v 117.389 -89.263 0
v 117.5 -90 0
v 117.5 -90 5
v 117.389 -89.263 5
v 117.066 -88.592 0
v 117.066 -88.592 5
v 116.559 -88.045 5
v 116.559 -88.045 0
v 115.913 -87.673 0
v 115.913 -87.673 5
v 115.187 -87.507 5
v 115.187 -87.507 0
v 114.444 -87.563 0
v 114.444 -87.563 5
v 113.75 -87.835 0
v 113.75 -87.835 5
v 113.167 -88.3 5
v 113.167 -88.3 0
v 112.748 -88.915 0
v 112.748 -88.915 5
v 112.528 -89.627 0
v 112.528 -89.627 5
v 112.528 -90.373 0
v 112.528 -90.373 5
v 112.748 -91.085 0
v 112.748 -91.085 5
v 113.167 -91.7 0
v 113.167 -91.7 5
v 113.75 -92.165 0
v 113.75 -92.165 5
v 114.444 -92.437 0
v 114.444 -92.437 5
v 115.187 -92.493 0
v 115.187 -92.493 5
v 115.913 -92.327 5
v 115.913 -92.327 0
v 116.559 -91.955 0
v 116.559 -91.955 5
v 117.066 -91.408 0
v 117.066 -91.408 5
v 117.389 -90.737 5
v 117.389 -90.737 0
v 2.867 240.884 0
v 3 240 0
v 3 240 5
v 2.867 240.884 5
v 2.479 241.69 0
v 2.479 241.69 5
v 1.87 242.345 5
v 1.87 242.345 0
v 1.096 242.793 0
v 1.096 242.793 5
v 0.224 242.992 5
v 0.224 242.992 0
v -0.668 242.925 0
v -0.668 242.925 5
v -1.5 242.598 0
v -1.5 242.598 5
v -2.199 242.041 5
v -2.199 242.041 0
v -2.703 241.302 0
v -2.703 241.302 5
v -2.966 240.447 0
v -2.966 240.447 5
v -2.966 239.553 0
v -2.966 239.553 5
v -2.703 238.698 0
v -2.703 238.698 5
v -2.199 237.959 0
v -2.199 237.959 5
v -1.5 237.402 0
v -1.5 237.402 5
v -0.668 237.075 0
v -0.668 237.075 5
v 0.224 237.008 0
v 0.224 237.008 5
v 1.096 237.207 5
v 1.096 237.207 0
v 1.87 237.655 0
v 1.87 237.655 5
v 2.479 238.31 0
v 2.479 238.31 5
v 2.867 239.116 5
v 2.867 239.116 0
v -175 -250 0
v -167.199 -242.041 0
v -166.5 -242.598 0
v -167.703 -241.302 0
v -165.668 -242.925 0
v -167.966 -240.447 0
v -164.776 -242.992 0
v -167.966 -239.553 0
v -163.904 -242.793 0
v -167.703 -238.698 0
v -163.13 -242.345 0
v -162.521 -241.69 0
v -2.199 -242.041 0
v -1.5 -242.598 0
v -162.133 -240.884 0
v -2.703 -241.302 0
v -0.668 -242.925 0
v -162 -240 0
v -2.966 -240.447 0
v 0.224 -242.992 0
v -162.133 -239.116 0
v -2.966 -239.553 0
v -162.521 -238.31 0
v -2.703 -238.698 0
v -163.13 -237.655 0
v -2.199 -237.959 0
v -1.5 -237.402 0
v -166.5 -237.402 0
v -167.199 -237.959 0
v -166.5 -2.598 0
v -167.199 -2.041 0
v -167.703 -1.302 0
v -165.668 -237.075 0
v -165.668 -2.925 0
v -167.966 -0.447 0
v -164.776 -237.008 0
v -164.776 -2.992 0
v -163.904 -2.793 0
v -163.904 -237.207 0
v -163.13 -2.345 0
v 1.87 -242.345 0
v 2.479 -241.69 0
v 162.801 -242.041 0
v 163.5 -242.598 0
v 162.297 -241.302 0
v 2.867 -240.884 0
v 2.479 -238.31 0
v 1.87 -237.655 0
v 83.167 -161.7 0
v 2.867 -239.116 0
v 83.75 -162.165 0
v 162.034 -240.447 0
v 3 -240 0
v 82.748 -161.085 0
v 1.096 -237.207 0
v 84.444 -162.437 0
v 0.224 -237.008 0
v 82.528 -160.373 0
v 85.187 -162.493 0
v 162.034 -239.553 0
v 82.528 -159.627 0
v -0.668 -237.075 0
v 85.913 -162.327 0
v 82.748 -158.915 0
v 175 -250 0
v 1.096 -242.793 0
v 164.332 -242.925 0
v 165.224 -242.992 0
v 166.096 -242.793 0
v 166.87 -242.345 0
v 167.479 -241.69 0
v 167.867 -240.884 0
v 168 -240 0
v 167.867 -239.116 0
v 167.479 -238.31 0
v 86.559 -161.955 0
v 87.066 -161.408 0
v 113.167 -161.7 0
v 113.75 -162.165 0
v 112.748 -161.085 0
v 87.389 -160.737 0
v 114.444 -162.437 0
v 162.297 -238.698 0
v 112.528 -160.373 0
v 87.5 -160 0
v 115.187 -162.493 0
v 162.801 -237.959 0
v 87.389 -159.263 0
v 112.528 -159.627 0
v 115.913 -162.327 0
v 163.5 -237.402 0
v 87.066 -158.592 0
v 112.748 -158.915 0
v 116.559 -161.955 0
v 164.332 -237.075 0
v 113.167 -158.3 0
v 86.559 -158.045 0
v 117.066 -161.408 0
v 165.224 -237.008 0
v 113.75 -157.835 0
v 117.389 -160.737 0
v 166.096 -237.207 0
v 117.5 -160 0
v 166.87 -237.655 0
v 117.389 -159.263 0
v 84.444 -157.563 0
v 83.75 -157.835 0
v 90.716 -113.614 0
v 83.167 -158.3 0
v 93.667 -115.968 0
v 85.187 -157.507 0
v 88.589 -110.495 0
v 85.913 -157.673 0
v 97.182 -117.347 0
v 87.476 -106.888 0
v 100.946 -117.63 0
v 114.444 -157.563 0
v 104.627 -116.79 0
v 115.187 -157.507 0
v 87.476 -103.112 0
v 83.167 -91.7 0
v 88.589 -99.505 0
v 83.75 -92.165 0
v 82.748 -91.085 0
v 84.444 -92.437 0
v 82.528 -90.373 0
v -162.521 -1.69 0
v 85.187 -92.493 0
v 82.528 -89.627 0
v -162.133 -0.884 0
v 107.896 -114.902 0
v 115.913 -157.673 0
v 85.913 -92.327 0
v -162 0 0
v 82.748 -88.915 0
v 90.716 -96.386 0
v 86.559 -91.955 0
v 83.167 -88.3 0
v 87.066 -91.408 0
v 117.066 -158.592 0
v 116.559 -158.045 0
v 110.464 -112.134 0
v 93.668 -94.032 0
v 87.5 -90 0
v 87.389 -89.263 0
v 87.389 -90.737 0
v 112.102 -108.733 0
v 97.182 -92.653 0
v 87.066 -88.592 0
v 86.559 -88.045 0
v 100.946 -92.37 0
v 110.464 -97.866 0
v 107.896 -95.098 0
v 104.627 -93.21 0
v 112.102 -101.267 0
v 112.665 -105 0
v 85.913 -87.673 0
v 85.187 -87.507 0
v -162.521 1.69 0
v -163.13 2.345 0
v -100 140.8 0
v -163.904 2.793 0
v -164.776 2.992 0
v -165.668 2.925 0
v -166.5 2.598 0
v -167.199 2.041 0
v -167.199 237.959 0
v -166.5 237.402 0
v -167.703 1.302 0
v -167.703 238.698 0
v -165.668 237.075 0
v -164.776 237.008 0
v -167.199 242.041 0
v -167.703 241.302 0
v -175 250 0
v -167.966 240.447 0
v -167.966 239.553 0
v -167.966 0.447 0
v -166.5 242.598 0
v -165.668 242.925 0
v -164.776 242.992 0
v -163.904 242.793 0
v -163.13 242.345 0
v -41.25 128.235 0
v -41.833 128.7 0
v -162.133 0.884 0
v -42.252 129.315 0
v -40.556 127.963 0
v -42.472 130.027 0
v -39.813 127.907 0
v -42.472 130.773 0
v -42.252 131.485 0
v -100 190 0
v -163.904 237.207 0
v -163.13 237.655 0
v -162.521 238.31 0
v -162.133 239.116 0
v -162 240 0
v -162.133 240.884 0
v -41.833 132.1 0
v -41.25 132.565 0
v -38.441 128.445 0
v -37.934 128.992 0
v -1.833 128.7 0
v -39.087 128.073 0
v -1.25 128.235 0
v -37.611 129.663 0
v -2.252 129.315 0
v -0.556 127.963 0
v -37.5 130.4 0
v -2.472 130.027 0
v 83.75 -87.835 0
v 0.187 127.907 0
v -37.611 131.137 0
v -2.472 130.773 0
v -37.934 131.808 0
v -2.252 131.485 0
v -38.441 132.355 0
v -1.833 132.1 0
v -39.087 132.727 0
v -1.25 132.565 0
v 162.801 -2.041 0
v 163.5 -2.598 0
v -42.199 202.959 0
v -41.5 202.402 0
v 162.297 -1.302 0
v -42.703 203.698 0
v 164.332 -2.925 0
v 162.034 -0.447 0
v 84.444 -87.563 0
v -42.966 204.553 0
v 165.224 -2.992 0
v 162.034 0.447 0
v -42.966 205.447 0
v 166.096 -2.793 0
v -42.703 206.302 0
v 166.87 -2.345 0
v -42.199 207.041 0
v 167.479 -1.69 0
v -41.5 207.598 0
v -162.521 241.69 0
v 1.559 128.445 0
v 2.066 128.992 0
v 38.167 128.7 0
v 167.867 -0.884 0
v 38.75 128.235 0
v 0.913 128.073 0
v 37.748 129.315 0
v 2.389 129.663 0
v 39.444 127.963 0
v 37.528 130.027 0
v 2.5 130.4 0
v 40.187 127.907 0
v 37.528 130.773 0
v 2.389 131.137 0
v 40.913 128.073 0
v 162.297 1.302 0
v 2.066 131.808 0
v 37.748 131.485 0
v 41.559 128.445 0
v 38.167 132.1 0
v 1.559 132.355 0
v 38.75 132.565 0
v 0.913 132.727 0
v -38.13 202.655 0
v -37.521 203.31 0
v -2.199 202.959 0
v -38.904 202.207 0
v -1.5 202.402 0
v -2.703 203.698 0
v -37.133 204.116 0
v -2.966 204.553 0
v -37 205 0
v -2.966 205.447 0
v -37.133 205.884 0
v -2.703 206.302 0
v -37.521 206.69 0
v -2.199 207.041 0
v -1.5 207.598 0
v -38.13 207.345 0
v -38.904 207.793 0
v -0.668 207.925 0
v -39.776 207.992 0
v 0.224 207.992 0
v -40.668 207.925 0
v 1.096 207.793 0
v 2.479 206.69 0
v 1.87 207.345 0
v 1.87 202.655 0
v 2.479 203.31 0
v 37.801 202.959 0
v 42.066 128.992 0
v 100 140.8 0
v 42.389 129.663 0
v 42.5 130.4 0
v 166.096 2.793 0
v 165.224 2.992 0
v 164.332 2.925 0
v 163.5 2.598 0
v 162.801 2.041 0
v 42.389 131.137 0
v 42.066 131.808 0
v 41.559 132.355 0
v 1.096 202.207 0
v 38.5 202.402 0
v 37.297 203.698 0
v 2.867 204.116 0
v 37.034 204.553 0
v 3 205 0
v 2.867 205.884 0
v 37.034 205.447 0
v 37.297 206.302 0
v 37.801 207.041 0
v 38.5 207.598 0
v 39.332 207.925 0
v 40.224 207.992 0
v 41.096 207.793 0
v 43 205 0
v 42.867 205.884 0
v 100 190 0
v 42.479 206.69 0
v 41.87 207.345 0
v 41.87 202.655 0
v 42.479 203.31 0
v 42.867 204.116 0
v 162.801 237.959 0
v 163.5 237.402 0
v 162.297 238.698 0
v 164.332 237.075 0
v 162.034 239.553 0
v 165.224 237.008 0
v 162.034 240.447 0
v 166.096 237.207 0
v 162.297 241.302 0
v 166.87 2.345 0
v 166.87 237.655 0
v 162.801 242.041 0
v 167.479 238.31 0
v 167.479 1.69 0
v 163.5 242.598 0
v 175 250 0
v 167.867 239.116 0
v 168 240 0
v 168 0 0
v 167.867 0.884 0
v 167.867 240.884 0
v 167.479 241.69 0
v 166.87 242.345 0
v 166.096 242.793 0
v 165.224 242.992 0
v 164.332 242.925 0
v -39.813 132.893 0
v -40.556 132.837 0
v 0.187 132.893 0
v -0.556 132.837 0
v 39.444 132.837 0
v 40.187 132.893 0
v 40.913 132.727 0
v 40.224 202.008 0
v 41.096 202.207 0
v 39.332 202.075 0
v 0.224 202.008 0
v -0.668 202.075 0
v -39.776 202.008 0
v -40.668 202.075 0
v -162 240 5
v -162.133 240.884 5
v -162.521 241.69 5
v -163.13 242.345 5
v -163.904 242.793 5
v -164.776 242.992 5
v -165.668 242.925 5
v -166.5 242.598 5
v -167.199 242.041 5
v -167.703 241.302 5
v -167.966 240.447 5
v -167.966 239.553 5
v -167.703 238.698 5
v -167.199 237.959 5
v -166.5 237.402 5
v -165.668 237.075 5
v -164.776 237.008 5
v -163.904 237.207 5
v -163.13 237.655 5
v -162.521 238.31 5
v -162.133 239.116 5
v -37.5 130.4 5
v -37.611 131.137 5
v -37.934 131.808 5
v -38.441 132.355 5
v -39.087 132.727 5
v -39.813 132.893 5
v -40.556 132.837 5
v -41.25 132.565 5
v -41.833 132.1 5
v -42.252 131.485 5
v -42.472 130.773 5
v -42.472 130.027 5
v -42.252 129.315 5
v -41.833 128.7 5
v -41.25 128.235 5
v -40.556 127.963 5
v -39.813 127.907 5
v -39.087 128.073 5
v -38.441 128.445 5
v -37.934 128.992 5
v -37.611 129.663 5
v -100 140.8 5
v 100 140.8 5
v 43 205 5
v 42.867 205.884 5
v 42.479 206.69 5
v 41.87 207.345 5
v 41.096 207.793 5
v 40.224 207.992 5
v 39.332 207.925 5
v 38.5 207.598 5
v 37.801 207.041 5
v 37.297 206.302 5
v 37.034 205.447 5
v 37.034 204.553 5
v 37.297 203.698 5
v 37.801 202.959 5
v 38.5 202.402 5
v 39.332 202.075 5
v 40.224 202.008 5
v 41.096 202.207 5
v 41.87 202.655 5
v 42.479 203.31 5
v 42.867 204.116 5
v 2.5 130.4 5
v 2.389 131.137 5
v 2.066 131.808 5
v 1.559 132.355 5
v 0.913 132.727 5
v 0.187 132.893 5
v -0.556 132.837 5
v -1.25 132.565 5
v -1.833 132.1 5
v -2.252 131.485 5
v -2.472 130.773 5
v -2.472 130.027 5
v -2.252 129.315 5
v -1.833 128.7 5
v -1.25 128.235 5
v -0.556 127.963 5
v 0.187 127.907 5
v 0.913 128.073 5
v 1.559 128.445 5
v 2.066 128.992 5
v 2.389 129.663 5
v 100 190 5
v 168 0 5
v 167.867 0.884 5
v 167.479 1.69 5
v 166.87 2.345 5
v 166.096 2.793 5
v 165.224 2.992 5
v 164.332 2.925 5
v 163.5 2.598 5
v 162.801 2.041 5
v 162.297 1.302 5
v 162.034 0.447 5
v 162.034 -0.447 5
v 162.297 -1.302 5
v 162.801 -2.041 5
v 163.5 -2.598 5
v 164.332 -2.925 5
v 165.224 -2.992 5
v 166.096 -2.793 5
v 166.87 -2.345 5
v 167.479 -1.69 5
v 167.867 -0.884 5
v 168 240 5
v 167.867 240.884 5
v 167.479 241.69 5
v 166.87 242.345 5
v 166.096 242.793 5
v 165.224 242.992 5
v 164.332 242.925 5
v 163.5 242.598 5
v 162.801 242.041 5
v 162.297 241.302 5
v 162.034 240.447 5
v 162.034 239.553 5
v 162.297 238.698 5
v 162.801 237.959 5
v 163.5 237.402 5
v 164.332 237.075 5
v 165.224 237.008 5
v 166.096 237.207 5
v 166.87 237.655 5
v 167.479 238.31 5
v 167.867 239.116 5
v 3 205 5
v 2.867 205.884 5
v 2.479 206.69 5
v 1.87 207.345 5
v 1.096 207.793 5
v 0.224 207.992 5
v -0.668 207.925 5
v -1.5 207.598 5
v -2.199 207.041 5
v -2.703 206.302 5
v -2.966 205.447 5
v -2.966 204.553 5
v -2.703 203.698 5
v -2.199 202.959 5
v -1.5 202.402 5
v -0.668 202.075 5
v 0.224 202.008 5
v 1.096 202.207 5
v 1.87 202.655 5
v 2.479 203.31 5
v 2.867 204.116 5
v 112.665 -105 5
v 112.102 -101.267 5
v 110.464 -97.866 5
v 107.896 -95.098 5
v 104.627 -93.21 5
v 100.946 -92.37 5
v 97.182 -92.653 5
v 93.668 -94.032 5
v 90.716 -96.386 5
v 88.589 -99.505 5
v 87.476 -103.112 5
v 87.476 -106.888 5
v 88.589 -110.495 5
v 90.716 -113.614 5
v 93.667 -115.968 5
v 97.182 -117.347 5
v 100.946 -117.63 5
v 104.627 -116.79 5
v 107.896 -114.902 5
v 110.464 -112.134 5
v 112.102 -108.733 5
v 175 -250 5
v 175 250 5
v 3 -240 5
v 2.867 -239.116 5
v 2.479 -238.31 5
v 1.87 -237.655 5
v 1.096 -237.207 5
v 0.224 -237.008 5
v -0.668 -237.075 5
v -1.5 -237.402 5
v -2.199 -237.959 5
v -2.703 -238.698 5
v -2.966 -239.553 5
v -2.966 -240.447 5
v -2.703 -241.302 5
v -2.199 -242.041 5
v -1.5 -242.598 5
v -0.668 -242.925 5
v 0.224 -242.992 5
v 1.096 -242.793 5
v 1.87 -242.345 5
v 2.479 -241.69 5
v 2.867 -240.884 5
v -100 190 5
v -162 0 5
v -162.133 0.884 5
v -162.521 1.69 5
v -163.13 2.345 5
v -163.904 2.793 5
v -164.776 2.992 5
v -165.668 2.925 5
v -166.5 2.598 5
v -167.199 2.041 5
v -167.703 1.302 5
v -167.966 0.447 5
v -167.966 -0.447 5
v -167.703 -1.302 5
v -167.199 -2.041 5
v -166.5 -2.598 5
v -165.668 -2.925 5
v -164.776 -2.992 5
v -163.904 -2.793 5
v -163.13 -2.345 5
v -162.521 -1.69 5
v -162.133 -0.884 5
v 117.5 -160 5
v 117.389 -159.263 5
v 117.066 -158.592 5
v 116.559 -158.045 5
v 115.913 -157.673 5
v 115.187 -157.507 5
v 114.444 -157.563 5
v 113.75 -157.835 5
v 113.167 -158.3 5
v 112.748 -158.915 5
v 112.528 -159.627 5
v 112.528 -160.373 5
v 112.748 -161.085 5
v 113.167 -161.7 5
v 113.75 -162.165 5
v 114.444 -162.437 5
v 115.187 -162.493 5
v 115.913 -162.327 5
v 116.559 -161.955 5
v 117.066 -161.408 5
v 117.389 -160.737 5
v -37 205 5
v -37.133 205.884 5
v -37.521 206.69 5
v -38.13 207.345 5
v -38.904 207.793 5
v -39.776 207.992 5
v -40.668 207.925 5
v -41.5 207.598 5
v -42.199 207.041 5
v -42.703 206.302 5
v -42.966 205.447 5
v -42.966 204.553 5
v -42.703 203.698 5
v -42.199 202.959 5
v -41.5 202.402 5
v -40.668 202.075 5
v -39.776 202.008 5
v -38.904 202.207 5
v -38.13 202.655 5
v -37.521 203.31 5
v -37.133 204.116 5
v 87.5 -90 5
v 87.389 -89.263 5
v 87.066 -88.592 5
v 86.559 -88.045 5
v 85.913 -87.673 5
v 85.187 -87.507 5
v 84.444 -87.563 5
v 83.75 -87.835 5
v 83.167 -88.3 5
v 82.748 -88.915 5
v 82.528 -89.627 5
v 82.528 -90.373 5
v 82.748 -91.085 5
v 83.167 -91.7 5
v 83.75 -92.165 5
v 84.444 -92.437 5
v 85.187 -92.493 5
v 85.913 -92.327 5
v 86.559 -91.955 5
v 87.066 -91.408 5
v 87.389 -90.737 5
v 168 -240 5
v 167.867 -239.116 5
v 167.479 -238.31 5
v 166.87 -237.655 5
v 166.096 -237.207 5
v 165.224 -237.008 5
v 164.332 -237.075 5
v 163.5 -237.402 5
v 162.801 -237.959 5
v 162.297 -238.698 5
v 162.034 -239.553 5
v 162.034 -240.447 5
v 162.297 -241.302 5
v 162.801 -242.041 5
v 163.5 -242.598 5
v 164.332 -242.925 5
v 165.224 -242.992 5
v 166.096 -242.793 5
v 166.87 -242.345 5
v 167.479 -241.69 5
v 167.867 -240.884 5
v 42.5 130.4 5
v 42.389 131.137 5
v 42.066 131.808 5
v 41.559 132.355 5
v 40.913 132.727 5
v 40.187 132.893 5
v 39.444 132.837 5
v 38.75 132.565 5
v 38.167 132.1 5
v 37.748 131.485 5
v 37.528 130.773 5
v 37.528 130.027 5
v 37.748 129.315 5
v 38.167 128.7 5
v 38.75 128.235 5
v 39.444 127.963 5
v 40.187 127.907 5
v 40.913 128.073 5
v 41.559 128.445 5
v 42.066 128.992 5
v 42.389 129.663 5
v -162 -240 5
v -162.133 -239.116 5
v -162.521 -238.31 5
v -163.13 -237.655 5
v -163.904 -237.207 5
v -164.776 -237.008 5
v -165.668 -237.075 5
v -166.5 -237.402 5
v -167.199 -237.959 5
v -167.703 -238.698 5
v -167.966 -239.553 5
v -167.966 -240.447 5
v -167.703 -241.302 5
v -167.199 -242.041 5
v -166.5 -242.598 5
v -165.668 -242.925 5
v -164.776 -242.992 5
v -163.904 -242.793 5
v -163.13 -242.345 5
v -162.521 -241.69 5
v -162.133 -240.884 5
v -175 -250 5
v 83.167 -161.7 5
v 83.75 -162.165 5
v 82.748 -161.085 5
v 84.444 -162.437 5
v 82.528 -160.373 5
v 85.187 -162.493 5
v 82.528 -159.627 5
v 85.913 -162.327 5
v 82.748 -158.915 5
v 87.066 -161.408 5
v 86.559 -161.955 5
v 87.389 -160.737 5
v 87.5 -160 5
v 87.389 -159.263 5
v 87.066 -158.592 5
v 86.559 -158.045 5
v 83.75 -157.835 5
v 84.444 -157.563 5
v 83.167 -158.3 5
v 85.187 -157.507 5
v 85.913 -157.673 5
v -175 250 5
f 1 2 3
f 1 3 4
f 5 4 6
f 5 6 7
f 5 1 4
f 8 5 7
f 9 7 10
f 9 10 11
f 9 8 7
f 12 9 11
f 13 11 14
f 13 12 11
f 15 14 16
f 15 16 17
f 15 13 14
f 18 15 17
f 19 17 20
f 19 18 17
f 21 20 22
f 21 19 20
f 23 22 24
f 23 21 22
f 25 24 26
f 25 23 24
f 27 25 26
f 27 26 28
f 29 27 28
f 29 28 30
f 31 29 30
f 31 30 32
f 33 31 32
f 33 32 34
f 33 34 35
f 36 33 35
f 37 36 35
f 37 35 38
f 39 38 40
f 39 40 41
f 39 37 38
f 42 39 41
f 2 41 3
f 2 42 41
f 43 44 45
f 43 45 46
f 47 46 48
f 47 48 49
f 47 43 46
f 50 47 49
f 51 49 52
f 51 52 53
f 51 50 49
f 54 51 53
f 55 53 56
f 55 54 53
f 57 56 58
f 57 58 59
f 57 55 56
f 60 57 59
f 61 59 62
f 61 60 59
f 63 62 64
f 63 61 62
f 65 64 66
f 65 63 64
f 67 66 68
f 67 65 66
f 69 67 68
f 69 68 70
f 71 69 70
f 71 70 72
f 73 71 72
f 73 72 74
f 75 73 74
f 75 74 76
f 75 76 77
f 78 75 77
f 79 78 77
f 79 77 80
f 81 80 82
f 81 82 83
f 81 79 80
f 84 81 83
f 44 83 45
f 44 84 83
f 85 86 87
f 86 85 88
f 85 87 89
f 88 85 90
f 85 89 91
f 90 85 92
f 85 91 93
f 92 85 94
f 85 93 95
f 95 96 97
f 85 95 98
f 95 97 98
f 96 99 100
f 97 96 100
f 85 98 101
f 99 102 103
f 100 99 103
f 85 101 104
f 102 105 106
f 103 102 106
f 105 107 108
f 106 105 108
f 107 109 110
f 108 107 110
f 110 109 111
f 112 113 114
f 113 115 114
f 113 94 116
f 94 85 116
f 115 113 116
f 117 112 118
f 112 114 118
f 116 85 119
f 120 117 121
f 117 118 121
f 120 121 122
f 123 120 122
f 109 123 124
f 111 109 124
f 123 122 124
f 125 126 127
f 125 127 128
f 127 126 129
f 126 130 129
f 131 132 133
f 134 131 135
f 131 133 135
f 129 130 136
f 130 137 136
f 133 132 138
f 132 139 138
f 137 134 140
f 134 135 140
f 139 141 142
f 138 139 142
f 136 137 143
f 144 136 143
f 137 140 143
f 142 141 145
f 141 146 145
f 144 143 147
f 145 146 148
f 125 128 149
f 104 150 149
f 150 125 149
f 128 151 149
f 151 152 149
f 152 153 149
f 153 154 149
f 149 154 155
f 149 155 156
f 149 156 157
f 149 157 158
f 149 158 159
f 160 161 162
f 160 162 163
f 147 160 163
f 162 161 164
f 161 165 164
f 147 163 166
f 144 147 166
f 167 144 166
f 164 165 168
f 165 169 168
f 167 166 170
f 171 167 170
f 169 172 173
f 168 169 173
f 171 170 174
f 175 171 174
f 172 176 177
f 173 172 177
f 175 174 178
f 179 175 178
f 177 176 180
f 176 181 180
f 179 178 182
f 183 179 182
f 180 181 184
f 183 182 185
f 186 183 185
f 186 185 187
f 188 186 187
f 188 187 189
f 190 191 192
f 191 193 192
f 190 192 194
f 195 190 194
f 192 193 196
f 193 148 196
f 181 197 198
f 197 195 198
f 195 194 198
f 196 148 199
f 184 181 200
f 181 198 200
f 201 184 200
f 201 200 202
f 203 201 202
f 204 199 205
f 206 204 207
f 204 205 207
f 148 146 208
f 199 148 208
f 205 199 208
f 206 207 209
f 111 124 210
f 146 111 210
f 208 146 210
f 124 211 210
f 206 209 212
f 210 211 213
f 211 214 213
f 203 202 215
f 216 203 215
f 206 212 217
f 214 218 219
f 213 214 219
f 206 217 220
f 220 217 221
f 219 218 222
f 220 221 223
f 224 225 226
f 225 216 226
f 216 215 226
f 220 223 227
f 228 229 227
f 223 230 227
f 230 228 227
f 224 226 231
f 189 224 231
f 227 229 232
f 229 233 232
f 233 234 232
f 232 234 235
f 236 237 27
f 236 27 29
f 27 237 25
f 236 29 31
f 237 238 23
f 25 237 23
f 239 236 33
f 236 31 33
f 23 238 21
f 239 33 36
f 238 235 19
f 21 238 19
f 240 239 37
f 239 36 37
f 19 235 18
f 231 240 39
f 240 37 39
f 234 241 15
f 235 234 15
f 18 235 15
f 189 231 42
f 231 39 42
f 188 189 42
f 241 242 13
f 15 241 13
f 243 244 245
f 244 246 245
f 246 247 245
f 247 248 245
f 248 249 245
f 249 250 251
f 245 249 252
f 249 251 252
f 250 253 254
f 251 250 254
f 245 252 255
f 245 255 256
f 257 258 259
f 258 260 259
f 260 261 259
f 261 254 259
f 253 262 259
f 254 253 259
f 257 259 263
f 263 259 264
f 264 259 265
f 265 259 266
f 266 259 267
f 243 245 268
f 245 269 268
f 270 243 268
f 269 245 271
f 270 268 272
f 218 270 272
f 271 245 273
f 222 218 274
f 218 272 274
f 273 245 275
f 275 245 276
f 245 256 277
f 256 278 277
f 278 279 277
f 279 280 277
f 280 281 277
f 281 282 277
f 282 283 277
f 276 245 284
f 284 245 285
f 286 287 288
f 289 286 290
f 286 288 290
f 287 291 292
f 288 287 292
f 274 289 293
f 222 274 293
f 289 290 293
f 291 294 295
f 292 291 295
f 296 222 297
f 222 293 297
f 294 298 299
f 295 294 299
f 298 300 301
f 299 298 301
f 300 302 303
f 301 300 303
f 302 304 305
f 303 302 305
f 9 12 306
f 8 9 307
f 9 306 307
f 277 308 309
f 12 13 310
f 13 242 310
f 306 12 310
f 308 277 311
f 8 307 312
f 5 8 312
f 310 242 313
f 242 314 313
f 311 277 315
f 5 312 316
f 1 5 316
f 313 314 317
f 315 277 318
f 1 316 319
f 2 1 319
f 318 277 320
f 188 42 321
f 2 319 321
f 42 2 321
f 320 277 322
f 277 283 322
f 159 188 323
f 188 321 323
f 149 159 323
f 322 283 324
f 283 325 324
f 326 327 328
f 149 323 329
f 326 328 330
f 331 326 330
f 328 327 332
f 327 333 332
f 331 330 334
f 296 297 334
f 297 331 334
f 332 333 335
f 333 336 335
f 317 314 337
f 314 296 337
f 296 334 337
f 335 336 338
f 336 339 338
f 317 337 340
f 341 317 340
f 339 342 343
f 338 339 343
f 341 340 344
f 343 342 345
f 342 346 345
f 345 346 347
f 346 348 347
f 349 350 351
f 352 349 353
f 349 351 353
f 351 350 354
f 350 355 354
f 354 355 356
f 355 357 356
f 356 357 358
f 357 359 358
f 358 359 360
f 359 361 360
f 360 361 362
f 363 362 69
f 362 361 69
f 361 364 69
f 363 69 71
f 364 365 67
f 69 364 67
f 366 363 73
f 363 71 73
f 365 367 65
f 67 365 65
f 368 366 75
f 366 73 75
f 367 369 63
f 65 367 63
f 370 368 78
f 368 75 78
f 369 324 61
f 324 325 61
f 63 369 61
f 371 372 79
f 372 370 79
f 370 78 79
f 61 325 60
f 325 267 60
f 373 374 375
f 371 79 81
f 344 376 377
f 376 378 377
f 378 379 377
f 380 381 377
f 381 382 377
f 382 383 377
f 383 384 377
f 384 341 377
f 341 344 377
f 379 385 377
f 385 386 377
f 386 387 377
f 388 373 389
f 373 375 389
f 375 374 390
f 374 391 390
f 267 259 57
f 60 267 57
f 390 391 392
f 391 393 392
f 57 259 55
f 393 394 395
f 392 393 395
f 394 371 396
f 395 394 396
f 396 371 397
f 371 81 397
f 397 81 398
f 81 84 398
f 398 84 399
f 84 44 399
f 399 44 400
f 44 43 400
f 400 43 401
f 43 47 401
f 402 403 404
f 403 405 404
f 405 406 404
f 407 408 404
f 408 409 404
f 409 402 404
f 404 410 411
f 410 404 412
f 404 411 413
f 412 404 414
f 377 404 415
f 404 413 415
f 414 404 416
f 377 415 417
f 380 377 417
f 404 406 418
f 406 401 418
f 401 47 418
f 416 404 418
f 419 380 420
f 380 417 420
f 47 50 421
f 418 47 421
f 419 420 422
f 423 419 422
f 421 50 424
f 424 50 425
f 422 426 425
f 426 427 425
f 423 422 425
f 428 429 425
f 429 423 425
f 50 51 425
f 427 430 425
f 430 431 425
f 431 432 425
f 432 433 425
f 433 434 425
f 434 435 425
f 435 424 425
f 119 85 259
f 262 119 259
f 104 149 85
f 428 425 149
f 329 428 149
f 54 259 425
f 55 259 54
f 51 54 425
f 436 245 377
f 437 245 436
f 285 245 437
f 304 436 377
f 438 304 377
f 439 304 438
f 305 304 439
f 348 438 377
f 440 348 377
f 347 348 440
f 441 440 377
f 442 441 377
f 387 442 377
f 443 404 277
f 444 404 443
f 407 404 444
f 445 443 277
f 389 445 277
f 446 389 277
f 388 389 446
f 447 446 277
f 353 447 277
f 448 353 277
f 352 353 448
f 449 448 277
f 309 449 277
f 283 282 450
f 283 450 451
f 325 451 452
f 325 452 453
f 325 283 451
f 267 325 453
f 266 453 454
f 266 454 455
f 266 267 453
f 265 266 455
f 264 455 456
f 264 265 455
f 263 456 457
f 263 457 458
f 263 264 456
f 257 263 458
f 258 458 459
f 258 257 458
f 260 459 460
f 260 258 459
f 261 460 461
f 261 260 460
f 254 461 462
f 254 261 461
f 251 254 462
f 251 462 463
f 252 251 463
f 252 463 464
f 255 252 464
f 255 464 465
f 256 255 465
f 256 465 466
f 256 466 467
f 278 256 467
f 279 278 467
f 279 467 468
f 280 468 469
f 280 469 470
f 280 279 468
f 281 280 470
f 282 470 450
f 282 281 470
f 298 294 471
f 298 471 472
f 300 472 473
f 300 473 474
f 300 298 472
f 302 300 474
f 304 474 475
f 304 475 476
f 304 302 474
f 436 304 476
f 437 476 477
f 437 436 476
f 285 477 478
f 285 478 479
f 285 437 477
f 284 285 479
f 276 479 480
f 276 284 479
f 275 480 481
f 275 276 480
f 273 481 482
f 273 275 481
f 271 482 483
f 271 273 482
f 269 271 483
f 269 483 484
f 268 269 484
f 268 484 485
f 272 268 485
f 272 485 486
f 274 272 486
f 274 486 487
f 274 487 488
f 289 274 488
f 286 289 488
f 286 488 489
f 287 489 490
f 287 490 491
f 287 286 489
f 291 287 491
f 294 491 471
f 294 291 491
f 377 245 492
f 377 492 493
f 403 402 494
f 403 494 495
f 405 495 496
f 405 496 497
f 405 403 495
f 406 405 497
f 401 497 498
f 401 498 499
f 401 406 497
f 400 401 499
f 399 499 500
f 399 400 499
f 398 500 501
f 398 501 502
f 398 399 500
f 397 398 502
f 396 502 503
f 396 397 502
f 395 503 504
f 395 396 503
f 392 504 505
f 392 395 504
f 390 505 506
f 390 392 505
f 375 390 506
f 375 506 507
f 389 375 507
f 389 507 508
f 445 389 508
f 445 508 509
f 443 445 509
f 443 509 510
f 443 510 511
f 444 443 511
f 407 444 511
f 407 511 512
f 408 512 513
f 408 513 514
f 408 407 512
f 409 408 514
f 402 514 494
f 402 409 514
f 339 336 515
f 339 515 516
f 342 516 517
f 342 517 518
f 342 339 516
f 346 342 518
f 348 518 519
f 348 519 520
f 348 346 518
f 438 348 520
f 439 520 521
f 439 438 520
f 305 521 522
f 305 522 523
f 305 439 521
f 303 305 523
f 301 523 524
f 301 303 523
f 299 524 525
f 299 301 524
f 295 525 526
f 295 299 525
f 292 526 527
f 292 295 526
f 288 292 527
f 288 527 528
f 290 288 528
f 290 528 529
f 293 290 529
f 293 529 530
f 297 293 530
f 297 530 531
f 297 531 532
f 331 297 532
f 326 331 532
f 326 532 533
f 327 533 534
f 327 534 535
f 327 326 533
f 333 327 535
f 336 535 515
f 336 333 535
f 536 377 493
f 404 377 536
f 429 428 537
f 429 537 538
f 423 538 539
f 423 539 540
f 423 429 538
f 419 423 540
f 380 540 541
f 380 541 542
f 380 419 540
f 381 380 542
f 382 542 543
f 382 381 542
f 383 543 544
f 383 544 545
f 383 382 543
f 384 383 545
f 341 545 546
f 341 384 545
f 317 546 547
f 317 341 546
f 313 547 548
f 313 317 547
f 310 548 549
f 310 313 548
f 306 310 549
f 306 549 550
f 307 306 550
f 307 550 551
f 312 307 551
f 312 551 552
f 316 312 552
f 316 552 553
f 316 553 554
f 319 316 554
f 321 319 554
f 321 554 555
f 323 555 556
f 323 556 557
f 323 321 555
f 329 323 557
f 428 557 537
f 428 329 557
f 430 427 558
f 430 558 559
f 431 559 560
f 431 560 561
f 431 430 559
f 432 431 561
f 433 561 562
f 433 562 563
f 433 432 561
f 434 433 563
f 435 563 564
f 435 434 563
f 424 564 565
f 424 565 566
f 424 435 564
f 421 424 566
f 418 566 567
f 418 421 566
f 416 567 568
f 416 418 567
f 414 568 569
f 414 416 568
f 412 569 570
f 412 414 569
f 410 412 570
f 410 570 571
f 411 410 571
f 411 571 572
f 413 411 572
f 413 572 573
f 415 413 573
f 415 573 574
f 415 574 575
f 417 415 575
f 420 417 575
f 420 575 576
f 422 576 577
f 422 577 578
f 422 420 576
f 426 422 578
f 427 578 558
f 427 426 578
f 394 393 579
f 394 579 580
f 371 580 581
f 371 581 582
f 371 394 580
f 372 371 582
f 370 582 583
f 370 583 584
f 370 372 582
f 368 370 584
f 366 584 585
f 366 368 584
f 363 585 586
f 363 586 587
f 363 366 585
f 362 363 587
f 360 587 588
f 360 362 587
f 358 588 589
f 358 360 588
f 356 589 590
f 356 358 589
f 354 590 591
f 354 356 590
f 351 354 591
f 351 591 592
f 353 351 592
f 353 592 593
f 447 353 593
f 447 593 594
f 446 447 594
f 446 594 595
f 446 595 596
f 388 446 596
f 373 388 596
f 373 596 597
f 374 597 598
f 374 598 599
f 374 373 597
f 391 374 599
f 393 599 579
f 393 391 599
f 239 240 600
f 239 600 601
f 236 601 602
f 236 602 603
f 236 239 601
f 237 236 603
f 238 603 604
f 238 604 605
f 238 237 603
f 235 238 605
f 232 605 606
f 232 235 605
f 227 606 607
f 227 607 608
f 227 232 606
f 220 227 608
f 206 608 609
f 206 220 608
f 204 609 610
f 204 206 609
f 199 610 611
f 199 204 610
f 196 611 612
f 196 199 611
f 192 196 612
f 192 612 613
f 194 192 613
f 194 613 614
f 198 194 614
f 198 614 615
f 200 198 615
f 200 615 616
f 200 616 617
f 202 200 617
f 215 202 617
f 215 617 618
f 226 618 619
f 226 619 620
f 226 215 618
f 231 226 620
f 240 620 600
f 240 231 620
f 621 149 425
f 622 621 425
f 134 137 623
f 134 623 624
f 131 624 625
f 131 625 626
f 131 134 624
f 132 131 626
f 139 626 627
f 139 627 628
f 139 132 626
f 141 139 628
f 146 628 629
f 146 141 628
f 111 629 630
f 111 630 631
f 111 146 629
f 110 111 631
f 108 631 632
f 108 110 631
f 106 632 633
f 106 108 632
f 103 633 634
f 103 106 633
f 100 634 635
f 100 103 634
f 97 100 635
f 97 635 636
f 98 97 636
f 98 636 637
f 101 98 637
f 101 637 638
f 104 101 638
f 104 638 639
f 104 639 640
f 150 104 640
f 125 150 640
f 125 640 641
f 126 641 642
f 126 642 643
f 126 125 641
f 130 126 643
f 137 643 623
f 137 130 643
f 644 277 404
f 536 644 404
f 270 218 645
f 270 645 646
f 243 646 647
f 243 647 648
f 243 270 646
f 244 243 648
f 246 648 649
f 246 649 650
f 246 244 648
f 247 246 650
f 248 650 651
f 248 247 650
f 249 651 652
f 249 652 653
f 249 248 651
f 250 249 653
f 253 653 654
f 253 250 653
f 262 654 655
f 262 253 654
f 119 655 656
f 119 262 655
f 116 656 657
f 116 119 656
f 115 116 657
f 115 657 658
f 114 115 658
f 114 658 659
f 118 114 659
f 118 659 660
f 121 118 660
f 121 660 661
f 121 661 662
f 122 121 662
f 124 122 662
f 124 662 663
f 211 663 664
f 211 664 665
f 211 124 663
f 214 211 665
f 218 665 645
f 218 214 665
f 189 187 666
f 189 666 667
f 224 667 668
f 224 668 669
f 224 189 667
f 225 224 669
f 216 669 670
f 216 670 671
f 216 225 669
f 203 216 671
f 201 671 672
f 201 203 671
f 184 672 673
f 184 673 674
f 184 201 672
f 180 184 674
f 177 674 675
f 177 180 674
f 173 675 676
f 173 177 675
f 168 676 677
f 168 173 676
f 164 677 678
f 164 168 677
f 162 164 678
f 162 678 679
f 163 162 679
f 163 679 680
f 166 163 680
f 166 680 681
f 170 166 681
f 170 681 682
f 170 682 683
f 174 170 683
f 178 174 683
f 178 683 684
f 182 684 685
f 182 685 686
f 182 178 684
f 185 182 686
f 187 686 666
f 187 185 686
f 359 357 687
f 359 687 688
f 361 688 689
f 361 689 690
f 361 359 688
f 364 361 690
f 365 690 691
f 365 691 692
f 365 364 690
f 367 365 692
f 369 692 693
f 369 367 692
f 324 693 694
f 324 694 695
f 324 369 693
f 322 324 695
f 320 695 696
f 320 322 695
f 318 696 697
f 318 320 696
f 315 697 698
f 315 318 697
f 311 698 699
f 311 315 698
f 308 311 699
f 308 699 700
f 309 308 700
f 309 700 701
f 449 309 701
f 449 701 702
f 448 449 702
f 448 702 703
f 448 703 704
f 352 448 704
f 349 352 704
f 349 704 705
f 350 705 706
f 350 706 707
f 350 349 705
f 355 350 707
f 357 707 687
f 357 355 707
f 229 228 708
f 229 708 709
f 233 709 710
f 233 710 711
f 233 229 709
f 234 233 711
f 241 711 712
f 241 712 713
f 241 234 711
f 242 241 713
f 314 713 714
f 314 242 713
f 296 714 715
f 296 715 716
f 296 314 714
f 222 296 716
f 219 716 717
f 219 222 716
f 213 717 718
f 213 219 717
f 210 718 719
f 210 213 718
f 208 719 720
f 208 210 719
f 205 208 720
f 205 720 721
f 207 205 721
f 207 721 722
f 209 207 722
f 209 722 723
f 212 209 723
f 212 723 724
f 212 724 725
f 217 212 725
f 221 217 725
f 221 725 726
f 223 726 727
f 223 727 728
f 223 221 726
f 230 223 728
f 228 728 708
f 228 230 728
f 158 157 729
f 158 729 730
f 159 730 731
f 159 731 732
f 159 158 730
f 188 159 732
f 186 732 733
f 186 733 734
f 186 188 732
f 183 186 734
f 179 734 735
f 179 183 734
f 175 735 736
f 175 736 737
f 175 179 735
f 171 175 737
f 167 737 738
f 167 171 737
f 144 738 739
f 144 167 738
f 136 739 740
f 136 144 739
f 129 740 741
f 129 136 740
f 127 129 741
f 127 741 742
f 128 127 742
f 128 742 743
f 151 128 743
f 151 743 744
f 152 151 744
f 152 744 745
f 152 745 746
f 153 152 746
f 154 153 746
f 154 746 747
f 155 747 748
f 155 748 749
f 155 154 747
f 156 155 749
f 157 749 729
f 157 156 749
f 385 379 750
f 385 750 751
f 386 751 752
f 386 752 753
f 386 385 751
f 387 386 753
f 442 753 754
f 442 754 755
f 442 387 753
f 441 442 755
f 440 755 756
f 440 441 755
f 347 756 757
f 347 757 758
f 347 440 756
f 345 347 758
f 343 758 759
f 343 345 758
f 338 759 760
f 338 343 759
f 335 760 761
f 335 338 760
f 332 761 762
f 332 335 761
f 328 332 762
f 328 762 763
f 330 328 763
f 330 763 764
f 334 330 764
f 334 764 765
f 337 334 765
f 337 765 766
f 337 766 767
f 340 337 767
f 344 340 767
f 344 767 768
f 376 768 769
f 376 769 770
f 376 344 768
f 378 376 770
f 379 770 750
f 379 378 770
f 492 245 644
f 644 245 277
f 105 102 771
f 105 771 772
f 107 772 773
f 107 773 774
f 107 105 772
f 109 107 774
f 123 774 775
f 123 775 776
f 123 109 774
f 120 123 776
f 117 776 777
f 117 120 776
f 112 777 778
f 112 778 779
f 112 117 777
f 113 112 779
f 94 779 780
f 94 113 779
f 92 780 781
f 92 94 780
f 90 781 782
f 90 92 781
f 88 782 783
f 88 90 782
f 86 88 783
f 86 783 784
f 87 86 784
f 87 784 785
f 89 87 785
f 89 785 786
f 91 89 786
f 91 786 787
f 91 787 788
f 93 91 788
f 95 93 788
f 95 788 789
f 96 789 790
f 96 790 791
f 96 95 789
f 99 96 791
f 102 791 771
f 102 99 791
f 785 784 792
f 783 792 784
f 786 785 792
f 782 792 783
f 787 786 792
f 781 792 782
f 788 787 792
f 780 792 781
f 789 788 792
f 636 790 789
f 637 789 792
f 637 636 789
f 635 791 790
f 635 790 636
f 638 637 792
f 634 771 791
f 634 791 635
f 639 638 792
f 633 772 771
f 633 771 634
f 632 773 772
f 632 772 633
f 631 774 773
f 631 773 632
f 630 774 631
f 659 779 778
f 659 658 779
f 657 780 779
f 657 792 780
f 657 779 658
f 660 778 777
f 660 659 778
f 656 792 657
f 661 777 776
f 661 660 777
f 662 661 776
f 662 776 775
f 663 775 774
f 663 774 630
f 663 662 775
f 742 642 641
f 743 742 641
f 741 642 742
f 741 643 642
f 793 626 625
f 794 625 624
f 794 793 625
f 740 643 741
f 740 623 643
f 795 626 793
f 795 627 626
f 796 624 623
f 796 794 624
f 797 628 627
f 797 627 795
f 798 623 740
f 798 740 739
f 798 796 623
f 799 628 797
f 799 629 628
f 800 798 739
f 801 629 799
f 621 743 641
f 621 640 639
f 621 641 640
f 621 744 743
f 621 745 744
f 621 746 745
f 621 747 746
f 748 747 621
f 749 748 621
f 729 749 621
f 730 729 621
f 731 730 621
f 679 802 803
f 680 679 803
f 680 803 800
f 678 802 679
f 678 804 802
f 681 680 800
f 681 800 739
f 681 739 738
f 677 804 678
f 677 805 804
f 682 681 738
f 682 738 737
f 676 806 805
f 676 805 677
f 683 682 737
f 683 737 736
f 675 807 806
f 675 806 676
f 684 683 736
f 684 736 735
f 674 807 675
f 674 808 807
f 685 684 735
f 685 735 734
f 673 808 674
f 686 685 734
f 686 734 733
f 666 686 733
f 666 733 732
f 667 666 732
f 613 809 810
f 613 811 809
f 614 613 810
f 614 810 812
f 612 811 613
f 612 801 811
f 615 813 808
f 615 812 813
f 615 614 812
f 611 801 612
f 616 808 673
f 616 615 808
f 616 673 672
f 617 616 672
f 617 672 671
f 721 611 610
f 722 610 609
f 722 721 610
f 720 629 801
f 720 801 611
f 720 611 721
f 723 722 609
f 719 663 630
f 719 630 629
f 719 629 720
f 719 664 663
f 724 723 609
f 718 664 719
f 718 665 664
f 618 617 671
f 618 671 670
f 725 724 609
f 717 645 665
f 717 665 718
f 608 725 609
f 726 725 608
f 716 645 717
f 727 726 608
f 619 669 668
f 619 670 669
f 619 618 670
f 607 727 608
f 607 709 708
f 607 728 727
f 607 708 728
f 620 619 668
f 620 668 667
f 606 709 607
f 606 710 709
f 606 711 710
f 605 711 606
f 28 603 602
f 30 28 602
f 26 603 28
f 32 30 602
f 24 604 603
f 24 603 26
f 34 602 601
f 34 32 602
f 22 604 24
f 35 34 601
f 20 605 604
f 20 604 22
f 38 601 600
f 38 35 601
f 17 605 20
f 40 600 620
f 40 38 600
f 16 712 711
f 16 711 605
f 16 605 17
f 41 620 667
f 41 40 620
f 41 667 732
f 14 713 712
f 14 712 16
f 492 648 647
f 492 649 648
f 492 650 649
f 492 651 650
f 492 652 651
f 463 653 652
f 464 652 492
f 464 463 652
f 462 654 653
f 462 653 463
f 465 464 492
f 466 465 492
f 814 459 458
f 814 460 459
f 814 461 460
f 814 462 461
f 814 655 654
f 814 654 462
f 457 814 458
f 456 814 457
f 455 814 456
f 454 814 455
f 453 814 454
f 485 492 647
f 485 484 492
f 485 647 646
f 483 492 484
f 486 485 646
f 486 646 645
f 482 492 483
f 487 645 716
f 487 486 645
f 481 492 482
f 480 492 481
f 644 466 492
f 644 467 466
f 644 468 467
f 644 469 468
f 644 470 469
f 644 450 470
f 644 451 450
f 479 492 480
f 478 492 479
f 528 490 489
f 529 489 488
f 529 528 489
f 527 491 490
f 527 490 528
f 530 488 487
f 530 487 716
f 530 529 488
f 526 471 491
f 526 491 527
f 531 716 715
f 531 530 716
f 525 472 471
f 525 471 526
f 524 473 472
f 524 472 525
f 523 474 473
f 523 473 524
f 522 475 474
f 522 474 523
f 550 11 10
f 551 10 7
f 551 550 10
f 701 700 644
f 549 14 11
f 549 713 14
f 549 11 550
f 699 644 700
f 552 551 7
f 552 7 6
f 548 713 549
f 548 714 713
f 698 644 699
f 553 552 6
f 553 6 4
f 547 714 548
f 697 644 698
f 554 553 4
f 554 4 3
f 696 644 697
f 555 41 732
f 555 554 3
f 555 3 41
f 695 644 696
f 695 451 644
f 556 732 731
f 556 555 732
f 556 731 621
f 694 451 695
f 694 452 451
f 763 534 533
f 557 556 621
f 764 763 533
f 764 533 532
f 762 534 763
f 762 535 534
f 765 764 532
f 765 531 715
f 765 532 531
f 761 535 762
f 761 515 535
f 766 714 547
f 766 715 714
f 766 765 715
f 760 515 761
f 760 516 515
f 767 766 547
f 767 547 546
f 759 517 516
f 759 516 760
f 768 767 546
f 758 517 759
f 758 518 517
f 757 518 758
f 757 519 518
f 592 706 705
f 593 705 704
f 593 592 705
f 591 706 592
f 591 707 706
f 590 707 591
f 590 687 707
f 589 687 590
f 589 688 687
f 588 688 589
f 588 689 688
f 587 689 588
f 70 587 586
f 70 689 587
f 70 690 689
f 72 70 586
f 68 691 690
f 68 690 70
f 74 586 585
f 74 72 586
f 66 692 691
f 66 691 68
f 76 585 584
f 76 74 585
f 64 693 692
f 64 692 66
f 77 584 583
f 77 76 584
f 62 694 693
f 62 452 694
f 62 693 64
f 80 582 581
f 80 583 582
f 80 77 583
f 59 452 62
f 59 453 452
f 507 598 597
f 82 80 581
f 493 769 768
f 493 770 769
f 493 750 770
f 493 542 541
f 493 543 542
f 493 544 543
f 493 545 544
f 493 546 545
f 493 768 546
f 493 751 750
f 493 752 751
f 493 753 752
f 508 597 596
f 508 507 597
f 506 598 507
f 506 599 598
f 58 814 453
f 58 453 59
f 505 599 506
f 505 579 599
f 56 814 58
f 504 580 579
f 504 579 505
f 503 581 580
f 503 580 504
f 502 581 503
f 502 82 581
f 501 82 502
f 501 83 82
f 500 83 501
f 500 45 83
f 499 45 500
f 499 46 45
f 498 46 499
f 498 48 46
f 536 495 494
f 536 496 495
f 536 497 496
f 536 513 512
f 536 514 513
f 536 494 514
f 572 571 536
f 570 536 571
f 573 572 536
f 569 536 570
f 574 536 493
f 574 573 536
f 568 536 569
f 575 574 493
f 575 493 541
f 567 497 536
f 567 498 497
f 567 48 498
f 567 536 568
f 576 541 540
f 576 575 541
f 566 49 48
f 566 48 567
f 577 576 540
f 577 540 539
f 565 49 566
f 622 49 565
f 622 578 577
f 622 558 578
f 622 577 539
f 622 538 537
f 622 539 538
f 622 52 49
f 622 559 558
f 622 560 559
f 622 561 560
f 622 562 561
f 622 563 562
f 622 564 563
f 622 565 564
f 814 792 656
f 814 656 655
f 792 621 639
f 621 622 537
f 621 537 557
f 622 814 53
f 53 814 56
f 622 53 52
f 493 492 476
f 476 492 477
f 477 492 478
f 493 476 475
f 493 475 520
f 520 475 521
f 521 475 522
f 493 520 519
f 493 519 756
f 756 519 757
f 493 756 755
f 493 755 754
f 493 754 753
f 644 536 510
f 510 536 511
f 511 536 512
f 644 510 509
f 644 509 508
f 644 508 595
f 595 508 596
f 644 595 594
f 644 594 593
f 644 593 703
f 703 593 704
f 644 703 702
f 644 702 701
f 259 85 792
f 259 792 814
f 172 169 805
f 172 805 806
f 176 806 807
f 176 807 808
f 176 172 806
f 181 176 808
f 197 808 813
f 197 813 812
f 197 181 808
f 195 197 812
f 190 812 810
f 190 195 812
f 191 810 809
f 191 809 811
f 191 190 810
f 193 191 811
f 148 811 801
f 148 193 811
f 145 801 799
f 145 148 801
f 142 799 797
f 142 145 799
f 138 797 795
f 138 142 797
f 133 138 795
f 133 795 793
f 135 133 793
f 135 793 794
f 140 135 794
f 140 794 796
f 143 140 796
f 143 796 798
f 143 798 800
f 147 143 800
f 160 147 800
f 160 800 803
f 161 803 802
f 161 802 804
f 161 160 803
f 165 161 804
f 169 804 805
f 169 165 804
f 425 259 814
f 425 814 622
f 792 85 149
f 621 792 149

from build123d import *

# Parameters (mm, degrees)
SKETCH1_W           = 350
SKETCH1_H           = 500
SKETCH1_R           = 3
SKETCH1_R_2         = 2.5
SKETCH1_R_3         = 12.665
SKETCH1_W_2         = 200
SKETCH1_H_2         = 49.2
BOSS_EXTRUDE1_DEPTH = 5


with BuildPart() as part:
    # Sketch1 → Boss-Extrude1 (new body)
    with BuildSketch(Plane.XY):
        Rectangle(SKETCH1_W, SKETCH1_H)
        with Locations((-165, 0)):
            Circle(SKETCH1_R, mode=Mode.SUBTRACT)
        with Locations((165, -240)):
            Circle(SKETCH1_R, mode=Mode.SUBTRACT)
        with Locations((165, 0)):
            Circle(SKETCH1_R, mode=Mode.SUBTRACT)
        with Locations((165, 240)):
            Circle(SKETCH1_R, mode=Mode.SUBTRACT)
        with Locations((0, 240)):
            Circle(SKETCH1_R, mode=Mode.SUBTRACT)
        with Locations((0, -240)):
            Circle(SKETCH1_R, mode=Mode.SUBTRACT)
        with Locations((-165, 240)):
            Circle(SKETCH1_R, mode=Mode.SUBTRACT)
        with Locations((-165, -240)):
            Circle(SKETCH1_R, mode=Mode.SUBTRACT)
        with Locations((40, 205)):
            Circle(SKETCH1_R, mode=Mode.SUBTRACT)
        with Locations((0, 205)):
            Circle(SKETCH1_R, mode=Mode.SUBTRACT)
        with Locations((-40, 205)):
            Circle(SKETCH1_R, mode=Mode.SUBTRACT)
        with Locations((0, 130.4)):
            Circle(SKETCH1_R_2, mode=Mode.SUBTRACT)
        with Locations((40, 130.4)):
            Circle(SKETCH1_R_2, mode=Mode.SUBTRACT)
        with Locations((-40, 130.4)):
            Circle(SKETCH1_R_2, mode=Mode.SUBTRACT)
        with Locations((115, -90)):
            Circle(SKETCH1_R_2, mode=Mode.SUBTRACT)
        with Locations((85, -90)):
            Circle(SKETCH1_R_2, mode=Mode.SUBTRACT)
        with Locations((115, -160)):
            Circle(SKETCH1_R_2, mode=Mode.SUBTRACT)
        with Locations((85, -160)):
            Circle(SKETCH1_R_2, mode=Mode.SUBTRACT)
        with Locations((100, -105)):
            Circle(SKETCH1_R_3, mode=Mode.SUBTRACT)
        with Locations((0, 165.4)):
            Rectangle(SKETCH1_W_2, SKETCH1_H_2, mode=Mode.SUBTRACT)
    extrude(amount=BOSS_EXTRUDE1_DEPTH)


solid = part.part
